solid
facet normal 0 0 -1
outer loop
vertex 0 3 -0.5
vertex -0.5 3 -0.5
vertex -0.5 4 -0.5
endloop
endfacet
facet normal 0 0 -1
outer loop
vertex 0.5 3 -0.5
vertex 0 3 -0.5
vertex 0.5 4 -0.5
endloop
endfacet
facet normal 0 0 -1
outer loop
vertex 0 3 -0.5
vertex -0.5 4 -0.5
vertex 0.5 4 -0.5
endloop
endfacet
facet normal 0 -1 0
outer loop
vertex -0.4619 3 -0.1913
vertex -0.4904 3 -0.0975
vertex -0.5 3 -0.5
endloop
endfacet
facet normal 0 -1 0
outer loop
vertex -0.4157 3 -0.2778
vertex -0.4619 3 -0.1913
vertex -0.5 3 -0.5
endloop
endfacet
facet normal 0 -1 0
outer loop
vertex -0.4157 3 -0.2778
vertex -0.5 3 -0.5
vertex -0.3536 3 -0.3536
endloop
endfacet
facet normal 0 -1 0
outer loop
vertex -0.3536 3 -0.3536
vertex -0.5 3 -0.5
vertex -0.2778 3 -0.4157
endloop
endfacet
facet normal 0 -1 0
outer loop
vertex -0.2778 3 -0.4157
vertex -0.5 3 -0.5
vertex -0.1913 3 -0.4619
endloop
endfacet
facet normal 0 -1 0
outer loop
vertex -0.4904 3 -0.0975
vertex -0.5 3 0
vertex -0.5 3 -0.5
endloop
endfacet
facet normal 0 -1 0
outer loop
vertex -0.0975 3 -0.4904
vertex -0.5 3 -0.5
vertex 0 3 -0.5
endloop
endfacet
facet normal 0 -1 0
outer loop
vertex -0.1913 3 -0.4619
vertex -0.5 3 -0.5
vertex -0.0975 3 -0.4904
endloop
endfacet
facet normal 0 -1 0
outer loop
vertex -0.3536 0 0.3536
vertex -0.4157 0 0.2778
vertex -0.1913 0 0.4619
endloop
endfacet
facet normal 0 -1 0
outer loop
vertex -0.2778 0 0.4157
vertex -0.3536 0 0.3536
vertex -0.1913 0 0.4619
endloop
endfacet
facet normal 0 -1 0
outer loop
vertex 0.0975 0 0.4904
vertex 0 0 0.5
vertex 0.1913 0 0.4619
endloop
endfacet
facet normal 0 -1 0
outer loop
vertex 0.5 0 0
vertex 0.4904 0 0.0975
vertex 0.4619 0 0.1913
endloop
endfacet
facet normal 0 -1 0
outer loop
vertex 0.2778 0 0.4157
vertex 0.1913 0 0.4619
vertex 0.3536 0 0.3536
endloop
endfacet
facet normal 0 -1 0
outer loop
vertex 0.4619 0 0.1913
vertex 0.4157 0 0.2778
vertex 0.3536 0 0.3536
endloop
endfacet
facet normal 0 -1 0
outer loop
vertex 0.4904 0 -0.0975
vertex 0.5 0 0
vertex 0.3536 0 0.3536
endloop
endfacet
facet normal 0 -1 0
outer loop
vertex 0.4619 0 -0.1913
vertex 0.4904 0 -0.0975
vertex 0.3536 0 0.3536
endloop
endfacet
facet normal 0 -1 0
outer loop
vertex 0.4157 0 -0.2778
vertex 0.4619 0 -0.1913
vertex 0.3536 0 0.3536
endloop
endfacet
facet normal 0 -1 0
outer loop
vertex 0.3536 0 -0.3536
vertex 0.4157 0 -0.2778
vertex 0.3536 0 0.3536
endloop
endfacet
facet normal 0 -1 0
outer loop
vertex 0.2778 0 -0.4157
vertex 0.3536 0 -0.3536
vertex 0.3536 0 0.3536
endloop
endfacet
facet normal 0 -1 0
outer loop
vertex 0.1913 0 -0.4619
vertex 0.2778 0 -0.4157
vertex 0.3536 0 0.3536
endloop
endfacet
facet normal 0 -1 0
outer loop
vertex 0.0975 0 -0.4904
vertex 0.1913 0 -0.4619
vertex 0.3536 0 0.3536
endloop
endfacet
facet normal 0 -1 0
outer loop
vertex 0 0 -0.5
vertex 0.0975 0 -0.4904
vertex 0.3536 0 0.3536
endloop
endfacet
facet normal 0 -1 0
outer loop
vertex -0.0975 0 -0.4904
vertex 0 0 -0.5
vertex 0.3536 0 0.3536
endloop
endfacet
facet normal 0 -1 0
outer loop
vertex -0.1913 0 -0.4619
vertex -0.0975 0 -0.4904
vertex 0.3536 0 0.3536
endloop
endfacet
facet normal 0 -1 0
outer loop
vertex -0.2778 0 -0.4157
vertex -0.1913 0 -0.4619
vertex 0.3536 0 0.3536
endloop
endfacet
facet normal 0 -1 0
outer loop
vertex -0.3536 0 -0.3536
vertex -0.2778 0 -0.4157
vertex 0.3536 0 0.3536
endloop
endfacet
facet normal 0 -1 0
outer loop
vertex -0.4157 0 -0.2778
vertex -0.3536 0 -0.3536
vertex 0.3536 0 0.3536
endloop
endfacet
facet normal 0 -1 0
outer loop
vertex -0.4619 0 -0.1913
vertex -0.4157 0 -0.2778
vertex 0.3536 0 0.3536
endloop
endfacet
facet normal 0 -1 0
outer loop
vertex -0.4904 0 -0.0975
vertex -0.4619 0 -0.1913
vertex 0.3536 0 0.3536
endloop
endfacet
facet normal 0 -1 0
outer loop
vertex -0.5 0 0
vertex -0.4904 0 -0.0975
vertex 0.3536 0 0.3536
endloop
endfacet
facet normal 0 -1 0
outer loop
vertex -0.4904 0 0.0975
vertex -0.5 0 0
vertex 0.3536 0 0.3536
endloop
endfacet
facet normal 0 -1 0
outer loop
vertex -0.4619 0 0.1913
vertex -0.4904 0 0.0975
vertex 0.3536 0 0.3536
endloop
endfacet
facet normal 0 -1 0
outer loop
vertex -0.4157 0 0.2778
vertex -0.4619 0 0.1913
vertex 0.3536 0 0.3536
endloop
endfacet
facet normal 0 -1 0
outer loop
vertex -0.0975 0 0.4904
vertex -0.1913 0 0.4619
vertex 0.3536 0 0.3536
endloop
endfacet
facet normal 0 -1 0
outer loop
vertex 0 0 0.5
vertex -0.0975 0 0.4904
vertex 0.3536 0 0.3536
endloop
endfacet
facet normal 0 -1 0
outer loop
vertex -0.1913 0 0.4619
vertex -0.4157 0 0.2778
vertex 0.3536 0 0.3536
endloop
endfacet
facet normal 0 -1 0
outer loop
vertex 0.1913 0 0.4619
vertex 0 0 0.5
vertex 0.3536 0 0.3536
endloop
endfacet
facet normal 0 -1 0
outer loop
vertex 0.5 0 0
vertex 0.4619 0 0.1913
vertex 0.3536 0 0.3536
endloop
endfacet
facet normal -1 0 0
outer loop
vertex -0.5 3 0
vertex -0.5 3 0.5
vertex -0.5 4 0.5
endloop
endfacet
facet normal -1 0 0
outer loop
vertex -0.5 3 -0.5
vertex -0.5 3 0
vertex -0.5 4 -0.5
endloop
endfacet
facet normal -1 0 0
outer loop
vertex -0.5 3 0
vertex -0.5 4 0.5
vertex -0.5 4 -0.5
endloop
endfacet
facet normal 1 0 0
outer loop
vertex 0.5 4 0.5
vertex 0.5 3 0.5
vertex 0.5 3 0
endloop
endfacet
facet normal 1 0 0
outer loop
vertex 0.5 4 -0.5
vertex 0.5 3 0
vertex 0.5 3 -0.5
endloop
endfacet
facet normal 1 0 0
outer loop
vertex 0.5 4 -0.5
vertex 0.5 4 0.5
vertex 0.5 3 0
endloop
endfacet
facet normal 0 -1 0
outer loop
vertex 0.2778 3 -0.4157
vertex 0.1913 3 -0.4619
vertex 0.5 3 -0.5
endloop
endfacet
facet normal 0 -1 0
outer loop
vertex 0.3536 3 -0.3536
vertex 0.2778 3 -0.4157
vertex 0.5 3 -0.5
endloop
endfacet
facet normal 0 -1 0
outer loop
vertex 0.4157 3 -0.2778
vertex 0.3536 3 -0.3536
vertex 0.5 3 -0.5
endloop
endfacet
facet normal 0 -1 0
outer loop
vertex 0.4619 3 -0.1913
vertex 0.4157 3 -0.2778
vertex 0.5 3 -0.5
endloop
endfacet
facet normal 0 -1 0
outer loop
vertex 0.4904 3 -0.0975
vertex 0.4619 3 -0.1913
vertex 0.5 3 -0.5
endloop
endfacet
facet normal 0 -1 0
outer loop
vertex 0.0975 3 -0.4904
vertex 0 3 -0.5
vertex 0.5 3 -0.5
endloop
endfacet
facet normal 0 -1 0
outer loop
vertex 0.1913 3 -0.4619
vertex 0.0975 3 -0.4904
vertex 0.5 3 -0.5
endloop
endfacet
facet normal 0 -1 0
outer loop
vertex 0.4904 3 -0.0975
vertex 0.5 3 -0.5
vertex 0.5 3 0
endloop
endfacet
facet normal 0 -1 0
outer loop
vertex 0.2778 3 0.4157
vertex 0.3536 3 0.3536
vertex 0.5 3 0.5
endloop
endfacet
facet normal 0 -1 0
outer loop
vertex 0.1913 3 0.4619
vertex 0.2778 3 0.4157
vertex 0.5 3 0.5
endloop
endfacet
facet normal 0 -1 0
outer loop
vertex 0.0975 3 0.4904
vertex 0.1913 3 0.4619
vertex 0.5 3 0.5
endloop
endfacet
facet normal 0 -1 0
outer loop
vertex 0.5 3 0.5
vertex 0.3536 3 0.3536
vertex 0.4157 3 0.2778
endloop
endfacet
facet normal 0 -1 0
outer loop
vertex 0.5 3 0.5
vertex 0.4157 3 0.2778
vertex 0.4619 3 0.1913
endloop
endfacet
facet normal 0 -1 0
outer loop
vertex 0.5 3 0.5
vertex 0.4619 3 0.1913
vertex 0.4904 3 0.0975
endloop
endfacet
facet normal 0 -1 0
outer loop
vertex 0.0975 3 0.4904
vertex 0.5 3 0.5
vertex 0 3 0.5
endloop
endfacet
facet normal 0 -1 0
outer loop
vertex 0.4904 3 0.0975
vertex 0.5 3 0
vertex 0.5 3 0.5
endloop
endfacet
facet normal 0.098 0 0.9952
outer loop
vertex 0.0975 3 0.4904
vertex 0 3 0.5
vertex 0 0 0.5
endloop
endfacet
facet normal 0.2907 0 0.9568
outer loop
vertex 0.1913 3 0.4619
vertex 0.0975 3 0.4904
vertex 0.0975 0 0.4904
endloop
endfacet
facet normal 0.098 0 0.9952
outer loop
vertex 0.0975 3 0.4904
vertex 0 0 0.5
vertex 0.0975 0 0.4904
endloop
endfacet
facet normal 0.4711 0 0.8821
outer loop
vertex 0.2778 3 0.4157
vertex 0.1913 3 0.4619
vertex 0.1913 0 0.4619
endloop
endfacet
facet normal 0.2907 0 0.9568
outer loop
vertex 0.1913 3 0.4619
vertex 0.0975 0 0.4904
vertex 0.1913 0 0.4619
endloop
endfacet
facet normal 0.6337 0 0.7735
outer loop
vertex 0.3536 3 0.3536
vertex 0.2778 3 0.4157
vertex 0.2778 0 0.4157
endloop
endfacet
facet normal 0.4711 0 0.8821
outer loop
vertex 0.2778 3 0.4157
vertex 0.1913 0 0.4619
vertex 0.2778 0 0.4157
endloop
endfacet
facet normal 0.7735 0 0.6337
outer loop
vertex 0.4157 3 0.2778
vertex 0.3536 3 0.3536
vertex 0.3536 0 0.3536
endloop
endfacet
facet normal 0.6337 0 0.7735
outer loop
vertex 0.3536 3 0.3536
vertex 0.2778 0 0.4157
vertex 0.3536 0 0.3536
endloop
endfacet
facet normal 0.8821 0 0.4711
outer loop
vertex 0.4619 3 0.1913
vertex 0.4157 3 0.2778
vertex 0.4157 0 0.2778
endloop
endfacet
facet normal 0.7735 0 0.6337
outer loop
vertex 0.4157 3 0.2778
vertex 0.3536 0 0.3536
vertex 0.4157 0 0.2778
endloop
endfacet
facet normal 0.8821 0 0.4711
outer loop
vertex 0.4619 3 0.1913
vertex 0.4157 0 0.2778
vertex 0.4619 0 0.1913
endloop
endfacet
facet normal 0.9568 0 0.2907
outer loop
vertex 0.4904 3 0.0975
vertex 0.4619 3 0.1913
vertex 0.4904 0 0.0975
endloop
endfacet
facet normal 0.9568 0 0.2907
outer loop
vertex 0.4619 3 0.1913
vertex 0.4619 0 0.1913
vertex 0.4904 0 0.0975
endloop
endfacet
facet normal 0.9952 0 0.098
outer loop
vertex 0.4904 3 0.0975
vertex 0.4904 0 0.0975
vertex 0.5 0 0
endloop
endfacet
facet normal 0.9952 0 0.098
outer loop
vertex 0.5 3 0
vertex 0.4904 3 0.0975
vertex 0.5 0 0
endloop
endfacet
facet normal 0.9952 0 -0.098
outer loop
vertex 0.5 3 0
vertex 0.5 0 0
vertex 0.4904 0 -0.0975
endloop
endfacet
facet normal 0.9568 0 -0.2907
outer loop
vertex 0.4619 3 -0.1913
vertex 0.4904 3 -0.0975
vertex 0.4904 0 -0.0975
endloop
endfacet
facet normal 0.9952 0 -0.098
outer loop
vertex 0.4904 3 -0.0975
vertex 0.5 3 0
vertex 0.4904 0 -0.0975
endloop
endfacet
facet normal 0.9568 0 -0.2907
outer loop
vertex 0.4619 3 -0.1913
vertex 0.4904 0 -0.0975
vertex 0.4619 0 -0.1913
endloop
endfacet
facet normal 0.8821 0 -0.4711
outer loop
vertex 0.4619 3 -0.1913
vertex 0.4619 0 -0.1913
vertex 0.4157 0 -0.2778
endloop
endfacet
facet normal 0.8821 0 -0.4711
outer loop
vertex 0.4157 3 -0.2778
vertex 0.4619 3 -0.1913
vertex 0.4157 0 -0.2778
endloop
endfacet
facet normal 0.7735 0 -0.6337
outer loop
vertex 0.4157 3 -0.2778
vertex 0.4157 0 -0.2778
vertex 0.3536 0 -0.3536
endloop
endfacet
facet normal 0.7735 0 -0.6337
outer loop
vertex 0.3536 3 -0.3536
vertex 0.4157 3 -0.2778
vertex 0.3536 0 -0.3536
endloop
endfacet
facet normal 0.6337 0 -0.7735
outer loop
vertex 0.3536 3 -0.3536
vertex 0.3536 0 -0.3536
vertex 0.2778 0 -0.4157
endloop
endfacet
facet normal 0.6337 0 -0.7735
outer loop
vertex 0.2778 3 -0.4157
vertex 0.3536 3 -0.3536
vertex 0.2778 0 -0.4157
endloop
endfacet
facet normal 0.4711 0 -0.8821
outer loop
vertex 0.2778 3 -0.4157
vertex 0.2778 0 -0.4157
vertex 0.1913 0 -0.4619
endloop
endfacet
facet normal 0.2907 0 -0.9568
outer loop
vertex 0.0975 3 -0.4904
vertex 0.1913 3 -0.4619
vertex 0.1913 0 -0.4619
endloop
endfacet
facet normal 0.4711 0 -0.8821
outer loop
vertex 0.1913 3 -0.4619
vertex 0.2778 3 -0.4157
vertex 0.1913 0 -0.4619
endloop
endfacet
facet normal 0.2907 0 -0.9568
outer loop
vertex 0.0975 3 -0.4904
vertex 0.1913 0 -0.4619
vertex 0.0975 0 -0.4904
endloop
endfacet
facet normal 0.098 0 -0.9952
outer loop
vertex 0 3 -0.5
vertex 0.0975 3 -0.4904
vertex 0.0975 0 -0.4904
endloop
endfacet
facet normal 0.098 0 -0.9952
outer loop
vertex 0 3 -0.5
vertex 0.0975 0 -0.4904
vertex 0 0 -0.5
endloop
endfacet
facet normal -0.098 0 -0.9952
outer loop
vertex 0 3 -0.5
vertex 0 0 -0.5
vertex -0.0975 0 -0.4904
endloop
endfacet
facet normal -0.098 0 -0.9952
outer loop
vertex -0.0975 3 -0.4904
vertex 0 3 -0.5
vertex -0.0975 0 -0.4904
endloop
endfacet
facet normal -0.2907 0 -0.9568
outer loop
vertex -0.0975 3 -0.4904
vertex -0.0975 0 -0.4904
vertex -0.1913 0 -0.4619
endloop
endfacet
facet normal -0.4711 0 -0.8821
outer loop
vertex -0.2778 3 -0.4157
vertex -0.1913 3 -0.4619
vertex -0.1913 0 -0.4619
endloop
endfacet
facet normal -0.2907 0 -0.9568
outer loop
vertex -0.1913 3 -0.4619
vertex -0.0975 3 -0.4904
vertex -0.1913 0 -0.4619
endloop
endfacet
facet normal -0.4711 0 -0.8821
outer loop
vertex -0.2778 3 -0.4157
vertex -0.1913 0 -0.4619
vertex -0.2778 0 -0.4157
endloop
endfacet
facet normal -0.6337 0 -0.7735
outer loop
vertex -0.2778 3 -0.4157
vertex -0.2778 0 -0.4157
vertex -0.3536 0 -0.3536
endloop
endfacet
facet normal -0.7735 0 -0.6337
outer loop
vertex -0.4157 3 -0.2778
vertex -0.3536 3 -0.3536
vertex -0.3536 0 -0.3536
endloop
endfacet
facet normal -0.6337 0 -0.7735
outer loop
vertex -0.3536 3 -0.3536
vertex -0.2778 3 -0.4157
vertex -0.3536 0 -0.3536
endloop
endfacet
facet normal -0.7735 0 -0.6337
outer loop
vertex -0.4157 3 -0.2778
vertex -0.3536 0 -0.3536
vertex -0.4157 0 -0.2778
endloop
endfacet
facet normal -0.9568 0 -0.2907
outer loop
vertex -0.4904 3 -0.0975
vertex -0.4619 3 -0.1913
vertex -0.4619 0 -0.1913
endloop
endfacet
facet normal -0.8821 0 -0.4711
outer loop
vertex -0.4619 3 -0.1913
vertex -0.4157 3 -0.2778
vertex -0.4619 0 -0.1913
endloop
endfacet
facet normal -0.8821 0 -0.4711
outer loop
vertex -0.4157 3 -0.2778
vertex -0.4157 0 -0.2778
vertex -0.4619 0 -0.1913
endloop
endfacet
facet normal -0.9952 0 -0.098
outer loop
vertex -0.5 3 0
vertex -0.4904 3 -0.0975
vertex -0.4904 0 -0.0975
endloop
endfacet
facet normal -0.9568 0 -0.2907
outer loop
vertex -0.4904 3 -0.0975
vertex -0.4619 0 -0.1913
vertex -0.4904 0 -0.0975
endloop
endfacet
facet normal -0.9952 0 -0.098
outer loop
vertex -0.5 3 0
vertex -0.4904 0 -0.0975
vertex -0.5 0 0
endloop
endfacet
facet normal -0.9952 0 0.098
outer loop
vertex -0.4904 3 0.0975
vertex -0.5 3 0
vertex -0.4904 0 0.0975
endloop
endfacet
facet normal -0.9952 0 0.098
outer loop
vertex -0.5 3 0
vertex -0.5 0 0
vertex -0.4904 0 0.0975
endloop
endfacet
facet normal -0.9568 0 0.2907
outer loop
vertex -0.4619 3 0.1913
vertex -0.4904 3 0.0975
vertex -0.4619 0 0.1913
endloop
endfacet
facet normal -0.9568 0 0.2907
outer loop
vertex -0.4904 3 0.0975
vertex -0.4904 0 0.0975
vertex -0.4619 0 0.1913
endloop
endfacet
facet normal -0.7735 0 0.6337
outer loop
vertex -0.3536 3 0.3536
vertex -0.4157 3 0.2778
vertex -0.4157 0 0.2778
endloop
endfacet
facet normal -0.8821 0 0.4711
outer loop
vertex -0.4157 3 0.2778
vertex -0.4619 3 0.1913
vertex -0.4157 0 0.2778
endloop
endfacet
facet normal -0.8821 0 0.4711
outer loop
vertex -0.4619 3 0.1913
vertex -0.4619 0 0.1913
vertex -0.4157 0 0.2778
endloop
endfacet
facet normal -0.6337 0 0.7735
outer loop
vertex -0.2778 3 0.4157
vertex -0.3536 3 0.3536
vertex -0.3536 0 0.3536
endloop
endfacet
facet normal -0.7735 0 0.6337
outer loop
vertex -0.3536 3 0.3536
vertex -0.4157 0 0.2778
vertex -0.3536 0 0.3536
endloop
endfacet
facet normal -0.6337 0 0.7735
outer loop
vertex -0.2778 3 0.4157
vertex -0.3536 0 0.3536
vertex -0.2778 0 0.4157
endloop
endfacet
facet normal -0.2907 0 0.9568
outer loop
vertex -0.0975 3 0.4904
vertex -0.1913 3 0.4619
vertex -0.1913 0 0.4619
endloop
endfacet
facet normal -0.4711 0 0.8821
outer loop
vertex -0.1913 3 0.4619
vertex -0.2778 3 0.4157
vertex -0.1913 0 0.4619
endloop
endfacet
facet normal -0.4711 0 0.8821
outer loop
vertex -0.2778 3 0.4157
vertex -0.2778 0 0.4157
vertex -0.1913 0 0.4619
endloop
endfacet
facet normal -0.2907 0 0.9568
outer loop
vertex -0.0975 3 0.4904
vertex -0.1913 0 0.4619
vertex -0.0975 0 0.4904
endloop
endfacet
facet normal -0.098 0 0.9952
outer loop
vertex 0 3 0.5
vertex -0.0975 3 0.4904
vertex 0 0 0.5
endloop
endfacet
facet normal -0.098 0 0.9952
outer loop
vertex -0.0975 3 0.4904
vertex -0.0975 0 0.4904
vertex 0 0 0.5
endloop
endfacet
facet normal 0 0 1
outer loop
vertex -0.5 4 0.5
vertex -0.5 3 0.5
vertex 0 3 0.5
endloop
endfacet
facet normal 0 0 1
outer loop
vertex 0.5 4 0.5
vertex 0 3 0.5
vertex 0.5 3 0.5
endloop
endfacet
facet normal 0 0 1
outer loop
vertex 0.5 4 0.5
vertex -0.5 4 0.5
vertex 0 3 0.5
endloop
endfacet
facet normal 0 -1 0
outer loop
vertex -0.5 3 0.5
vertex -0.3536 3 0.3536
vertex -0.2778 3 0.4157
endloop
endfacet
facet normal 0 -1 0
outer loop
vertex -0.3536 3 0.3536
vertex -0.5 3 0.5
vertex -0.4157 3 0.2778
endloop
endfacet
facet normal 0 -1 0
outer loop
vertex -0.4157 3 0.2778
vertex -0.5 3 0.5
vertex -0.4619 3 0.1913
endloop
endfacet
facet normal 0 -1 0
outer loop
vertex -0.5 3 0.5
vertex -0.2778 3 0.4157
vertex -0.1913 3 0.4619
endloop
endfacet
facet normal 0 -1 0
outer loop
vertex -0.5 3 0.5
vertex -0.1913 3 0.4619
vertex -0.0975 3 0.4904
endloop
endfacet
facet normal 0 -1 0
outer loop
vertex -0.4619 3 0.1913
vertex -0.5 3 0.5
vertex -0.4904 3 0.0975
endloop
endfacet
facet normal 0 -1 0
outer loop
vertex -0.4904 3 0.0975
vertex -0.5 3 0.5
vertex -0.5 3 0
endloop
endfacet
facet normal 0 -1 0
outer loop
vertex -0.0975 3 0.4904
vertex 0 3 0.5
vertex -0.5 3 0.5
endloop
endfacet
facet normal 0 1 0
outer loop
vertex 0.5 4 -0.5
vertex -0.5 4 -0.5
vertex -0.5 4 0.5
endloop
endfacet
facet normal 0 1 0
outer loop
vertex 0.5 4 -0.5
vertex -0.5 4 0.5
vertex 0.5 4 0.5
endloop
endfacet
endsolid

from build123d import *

# Parameters (mm, degrees)
ESBO_O1_R                = 0.5
RESSALTO_EXTRUS_O1_DEPTH = 4
ESBO_O2_W                = 1
ESBO_O2_H                = 1
RESSALTO_EXTRUS_O2_DEPTH = 1


with BuildPart() as part:
    # Esboço1 → Ressalto-extrusão1 (new body)
    with BuildSketch(Plane(origin=(0, 0, 0), x_dir=(1, 0, 0), z_dir=(0, 1, 0))):
        with Locations(Location((0, 0, 0), (0, 0, 270))):
            Circle(ESBO_O1_R)
    extrude(amount=RESSALTO_EXTRUS_O1_DEPTH)

    # Esboço2 → Ressalto-extrusão2 (add)
    with BuildSketch(Plane(origin=(0, 4, 0), x_dir=(1, 0, 0), z_dir=(0, 1, 0))):
        Rectangle(ESBO_O2_W, ESBO_O2_H)
    extrude(amount=-RESSALTO_EXTRUS_O2_DEPTH)


solid = part.part
